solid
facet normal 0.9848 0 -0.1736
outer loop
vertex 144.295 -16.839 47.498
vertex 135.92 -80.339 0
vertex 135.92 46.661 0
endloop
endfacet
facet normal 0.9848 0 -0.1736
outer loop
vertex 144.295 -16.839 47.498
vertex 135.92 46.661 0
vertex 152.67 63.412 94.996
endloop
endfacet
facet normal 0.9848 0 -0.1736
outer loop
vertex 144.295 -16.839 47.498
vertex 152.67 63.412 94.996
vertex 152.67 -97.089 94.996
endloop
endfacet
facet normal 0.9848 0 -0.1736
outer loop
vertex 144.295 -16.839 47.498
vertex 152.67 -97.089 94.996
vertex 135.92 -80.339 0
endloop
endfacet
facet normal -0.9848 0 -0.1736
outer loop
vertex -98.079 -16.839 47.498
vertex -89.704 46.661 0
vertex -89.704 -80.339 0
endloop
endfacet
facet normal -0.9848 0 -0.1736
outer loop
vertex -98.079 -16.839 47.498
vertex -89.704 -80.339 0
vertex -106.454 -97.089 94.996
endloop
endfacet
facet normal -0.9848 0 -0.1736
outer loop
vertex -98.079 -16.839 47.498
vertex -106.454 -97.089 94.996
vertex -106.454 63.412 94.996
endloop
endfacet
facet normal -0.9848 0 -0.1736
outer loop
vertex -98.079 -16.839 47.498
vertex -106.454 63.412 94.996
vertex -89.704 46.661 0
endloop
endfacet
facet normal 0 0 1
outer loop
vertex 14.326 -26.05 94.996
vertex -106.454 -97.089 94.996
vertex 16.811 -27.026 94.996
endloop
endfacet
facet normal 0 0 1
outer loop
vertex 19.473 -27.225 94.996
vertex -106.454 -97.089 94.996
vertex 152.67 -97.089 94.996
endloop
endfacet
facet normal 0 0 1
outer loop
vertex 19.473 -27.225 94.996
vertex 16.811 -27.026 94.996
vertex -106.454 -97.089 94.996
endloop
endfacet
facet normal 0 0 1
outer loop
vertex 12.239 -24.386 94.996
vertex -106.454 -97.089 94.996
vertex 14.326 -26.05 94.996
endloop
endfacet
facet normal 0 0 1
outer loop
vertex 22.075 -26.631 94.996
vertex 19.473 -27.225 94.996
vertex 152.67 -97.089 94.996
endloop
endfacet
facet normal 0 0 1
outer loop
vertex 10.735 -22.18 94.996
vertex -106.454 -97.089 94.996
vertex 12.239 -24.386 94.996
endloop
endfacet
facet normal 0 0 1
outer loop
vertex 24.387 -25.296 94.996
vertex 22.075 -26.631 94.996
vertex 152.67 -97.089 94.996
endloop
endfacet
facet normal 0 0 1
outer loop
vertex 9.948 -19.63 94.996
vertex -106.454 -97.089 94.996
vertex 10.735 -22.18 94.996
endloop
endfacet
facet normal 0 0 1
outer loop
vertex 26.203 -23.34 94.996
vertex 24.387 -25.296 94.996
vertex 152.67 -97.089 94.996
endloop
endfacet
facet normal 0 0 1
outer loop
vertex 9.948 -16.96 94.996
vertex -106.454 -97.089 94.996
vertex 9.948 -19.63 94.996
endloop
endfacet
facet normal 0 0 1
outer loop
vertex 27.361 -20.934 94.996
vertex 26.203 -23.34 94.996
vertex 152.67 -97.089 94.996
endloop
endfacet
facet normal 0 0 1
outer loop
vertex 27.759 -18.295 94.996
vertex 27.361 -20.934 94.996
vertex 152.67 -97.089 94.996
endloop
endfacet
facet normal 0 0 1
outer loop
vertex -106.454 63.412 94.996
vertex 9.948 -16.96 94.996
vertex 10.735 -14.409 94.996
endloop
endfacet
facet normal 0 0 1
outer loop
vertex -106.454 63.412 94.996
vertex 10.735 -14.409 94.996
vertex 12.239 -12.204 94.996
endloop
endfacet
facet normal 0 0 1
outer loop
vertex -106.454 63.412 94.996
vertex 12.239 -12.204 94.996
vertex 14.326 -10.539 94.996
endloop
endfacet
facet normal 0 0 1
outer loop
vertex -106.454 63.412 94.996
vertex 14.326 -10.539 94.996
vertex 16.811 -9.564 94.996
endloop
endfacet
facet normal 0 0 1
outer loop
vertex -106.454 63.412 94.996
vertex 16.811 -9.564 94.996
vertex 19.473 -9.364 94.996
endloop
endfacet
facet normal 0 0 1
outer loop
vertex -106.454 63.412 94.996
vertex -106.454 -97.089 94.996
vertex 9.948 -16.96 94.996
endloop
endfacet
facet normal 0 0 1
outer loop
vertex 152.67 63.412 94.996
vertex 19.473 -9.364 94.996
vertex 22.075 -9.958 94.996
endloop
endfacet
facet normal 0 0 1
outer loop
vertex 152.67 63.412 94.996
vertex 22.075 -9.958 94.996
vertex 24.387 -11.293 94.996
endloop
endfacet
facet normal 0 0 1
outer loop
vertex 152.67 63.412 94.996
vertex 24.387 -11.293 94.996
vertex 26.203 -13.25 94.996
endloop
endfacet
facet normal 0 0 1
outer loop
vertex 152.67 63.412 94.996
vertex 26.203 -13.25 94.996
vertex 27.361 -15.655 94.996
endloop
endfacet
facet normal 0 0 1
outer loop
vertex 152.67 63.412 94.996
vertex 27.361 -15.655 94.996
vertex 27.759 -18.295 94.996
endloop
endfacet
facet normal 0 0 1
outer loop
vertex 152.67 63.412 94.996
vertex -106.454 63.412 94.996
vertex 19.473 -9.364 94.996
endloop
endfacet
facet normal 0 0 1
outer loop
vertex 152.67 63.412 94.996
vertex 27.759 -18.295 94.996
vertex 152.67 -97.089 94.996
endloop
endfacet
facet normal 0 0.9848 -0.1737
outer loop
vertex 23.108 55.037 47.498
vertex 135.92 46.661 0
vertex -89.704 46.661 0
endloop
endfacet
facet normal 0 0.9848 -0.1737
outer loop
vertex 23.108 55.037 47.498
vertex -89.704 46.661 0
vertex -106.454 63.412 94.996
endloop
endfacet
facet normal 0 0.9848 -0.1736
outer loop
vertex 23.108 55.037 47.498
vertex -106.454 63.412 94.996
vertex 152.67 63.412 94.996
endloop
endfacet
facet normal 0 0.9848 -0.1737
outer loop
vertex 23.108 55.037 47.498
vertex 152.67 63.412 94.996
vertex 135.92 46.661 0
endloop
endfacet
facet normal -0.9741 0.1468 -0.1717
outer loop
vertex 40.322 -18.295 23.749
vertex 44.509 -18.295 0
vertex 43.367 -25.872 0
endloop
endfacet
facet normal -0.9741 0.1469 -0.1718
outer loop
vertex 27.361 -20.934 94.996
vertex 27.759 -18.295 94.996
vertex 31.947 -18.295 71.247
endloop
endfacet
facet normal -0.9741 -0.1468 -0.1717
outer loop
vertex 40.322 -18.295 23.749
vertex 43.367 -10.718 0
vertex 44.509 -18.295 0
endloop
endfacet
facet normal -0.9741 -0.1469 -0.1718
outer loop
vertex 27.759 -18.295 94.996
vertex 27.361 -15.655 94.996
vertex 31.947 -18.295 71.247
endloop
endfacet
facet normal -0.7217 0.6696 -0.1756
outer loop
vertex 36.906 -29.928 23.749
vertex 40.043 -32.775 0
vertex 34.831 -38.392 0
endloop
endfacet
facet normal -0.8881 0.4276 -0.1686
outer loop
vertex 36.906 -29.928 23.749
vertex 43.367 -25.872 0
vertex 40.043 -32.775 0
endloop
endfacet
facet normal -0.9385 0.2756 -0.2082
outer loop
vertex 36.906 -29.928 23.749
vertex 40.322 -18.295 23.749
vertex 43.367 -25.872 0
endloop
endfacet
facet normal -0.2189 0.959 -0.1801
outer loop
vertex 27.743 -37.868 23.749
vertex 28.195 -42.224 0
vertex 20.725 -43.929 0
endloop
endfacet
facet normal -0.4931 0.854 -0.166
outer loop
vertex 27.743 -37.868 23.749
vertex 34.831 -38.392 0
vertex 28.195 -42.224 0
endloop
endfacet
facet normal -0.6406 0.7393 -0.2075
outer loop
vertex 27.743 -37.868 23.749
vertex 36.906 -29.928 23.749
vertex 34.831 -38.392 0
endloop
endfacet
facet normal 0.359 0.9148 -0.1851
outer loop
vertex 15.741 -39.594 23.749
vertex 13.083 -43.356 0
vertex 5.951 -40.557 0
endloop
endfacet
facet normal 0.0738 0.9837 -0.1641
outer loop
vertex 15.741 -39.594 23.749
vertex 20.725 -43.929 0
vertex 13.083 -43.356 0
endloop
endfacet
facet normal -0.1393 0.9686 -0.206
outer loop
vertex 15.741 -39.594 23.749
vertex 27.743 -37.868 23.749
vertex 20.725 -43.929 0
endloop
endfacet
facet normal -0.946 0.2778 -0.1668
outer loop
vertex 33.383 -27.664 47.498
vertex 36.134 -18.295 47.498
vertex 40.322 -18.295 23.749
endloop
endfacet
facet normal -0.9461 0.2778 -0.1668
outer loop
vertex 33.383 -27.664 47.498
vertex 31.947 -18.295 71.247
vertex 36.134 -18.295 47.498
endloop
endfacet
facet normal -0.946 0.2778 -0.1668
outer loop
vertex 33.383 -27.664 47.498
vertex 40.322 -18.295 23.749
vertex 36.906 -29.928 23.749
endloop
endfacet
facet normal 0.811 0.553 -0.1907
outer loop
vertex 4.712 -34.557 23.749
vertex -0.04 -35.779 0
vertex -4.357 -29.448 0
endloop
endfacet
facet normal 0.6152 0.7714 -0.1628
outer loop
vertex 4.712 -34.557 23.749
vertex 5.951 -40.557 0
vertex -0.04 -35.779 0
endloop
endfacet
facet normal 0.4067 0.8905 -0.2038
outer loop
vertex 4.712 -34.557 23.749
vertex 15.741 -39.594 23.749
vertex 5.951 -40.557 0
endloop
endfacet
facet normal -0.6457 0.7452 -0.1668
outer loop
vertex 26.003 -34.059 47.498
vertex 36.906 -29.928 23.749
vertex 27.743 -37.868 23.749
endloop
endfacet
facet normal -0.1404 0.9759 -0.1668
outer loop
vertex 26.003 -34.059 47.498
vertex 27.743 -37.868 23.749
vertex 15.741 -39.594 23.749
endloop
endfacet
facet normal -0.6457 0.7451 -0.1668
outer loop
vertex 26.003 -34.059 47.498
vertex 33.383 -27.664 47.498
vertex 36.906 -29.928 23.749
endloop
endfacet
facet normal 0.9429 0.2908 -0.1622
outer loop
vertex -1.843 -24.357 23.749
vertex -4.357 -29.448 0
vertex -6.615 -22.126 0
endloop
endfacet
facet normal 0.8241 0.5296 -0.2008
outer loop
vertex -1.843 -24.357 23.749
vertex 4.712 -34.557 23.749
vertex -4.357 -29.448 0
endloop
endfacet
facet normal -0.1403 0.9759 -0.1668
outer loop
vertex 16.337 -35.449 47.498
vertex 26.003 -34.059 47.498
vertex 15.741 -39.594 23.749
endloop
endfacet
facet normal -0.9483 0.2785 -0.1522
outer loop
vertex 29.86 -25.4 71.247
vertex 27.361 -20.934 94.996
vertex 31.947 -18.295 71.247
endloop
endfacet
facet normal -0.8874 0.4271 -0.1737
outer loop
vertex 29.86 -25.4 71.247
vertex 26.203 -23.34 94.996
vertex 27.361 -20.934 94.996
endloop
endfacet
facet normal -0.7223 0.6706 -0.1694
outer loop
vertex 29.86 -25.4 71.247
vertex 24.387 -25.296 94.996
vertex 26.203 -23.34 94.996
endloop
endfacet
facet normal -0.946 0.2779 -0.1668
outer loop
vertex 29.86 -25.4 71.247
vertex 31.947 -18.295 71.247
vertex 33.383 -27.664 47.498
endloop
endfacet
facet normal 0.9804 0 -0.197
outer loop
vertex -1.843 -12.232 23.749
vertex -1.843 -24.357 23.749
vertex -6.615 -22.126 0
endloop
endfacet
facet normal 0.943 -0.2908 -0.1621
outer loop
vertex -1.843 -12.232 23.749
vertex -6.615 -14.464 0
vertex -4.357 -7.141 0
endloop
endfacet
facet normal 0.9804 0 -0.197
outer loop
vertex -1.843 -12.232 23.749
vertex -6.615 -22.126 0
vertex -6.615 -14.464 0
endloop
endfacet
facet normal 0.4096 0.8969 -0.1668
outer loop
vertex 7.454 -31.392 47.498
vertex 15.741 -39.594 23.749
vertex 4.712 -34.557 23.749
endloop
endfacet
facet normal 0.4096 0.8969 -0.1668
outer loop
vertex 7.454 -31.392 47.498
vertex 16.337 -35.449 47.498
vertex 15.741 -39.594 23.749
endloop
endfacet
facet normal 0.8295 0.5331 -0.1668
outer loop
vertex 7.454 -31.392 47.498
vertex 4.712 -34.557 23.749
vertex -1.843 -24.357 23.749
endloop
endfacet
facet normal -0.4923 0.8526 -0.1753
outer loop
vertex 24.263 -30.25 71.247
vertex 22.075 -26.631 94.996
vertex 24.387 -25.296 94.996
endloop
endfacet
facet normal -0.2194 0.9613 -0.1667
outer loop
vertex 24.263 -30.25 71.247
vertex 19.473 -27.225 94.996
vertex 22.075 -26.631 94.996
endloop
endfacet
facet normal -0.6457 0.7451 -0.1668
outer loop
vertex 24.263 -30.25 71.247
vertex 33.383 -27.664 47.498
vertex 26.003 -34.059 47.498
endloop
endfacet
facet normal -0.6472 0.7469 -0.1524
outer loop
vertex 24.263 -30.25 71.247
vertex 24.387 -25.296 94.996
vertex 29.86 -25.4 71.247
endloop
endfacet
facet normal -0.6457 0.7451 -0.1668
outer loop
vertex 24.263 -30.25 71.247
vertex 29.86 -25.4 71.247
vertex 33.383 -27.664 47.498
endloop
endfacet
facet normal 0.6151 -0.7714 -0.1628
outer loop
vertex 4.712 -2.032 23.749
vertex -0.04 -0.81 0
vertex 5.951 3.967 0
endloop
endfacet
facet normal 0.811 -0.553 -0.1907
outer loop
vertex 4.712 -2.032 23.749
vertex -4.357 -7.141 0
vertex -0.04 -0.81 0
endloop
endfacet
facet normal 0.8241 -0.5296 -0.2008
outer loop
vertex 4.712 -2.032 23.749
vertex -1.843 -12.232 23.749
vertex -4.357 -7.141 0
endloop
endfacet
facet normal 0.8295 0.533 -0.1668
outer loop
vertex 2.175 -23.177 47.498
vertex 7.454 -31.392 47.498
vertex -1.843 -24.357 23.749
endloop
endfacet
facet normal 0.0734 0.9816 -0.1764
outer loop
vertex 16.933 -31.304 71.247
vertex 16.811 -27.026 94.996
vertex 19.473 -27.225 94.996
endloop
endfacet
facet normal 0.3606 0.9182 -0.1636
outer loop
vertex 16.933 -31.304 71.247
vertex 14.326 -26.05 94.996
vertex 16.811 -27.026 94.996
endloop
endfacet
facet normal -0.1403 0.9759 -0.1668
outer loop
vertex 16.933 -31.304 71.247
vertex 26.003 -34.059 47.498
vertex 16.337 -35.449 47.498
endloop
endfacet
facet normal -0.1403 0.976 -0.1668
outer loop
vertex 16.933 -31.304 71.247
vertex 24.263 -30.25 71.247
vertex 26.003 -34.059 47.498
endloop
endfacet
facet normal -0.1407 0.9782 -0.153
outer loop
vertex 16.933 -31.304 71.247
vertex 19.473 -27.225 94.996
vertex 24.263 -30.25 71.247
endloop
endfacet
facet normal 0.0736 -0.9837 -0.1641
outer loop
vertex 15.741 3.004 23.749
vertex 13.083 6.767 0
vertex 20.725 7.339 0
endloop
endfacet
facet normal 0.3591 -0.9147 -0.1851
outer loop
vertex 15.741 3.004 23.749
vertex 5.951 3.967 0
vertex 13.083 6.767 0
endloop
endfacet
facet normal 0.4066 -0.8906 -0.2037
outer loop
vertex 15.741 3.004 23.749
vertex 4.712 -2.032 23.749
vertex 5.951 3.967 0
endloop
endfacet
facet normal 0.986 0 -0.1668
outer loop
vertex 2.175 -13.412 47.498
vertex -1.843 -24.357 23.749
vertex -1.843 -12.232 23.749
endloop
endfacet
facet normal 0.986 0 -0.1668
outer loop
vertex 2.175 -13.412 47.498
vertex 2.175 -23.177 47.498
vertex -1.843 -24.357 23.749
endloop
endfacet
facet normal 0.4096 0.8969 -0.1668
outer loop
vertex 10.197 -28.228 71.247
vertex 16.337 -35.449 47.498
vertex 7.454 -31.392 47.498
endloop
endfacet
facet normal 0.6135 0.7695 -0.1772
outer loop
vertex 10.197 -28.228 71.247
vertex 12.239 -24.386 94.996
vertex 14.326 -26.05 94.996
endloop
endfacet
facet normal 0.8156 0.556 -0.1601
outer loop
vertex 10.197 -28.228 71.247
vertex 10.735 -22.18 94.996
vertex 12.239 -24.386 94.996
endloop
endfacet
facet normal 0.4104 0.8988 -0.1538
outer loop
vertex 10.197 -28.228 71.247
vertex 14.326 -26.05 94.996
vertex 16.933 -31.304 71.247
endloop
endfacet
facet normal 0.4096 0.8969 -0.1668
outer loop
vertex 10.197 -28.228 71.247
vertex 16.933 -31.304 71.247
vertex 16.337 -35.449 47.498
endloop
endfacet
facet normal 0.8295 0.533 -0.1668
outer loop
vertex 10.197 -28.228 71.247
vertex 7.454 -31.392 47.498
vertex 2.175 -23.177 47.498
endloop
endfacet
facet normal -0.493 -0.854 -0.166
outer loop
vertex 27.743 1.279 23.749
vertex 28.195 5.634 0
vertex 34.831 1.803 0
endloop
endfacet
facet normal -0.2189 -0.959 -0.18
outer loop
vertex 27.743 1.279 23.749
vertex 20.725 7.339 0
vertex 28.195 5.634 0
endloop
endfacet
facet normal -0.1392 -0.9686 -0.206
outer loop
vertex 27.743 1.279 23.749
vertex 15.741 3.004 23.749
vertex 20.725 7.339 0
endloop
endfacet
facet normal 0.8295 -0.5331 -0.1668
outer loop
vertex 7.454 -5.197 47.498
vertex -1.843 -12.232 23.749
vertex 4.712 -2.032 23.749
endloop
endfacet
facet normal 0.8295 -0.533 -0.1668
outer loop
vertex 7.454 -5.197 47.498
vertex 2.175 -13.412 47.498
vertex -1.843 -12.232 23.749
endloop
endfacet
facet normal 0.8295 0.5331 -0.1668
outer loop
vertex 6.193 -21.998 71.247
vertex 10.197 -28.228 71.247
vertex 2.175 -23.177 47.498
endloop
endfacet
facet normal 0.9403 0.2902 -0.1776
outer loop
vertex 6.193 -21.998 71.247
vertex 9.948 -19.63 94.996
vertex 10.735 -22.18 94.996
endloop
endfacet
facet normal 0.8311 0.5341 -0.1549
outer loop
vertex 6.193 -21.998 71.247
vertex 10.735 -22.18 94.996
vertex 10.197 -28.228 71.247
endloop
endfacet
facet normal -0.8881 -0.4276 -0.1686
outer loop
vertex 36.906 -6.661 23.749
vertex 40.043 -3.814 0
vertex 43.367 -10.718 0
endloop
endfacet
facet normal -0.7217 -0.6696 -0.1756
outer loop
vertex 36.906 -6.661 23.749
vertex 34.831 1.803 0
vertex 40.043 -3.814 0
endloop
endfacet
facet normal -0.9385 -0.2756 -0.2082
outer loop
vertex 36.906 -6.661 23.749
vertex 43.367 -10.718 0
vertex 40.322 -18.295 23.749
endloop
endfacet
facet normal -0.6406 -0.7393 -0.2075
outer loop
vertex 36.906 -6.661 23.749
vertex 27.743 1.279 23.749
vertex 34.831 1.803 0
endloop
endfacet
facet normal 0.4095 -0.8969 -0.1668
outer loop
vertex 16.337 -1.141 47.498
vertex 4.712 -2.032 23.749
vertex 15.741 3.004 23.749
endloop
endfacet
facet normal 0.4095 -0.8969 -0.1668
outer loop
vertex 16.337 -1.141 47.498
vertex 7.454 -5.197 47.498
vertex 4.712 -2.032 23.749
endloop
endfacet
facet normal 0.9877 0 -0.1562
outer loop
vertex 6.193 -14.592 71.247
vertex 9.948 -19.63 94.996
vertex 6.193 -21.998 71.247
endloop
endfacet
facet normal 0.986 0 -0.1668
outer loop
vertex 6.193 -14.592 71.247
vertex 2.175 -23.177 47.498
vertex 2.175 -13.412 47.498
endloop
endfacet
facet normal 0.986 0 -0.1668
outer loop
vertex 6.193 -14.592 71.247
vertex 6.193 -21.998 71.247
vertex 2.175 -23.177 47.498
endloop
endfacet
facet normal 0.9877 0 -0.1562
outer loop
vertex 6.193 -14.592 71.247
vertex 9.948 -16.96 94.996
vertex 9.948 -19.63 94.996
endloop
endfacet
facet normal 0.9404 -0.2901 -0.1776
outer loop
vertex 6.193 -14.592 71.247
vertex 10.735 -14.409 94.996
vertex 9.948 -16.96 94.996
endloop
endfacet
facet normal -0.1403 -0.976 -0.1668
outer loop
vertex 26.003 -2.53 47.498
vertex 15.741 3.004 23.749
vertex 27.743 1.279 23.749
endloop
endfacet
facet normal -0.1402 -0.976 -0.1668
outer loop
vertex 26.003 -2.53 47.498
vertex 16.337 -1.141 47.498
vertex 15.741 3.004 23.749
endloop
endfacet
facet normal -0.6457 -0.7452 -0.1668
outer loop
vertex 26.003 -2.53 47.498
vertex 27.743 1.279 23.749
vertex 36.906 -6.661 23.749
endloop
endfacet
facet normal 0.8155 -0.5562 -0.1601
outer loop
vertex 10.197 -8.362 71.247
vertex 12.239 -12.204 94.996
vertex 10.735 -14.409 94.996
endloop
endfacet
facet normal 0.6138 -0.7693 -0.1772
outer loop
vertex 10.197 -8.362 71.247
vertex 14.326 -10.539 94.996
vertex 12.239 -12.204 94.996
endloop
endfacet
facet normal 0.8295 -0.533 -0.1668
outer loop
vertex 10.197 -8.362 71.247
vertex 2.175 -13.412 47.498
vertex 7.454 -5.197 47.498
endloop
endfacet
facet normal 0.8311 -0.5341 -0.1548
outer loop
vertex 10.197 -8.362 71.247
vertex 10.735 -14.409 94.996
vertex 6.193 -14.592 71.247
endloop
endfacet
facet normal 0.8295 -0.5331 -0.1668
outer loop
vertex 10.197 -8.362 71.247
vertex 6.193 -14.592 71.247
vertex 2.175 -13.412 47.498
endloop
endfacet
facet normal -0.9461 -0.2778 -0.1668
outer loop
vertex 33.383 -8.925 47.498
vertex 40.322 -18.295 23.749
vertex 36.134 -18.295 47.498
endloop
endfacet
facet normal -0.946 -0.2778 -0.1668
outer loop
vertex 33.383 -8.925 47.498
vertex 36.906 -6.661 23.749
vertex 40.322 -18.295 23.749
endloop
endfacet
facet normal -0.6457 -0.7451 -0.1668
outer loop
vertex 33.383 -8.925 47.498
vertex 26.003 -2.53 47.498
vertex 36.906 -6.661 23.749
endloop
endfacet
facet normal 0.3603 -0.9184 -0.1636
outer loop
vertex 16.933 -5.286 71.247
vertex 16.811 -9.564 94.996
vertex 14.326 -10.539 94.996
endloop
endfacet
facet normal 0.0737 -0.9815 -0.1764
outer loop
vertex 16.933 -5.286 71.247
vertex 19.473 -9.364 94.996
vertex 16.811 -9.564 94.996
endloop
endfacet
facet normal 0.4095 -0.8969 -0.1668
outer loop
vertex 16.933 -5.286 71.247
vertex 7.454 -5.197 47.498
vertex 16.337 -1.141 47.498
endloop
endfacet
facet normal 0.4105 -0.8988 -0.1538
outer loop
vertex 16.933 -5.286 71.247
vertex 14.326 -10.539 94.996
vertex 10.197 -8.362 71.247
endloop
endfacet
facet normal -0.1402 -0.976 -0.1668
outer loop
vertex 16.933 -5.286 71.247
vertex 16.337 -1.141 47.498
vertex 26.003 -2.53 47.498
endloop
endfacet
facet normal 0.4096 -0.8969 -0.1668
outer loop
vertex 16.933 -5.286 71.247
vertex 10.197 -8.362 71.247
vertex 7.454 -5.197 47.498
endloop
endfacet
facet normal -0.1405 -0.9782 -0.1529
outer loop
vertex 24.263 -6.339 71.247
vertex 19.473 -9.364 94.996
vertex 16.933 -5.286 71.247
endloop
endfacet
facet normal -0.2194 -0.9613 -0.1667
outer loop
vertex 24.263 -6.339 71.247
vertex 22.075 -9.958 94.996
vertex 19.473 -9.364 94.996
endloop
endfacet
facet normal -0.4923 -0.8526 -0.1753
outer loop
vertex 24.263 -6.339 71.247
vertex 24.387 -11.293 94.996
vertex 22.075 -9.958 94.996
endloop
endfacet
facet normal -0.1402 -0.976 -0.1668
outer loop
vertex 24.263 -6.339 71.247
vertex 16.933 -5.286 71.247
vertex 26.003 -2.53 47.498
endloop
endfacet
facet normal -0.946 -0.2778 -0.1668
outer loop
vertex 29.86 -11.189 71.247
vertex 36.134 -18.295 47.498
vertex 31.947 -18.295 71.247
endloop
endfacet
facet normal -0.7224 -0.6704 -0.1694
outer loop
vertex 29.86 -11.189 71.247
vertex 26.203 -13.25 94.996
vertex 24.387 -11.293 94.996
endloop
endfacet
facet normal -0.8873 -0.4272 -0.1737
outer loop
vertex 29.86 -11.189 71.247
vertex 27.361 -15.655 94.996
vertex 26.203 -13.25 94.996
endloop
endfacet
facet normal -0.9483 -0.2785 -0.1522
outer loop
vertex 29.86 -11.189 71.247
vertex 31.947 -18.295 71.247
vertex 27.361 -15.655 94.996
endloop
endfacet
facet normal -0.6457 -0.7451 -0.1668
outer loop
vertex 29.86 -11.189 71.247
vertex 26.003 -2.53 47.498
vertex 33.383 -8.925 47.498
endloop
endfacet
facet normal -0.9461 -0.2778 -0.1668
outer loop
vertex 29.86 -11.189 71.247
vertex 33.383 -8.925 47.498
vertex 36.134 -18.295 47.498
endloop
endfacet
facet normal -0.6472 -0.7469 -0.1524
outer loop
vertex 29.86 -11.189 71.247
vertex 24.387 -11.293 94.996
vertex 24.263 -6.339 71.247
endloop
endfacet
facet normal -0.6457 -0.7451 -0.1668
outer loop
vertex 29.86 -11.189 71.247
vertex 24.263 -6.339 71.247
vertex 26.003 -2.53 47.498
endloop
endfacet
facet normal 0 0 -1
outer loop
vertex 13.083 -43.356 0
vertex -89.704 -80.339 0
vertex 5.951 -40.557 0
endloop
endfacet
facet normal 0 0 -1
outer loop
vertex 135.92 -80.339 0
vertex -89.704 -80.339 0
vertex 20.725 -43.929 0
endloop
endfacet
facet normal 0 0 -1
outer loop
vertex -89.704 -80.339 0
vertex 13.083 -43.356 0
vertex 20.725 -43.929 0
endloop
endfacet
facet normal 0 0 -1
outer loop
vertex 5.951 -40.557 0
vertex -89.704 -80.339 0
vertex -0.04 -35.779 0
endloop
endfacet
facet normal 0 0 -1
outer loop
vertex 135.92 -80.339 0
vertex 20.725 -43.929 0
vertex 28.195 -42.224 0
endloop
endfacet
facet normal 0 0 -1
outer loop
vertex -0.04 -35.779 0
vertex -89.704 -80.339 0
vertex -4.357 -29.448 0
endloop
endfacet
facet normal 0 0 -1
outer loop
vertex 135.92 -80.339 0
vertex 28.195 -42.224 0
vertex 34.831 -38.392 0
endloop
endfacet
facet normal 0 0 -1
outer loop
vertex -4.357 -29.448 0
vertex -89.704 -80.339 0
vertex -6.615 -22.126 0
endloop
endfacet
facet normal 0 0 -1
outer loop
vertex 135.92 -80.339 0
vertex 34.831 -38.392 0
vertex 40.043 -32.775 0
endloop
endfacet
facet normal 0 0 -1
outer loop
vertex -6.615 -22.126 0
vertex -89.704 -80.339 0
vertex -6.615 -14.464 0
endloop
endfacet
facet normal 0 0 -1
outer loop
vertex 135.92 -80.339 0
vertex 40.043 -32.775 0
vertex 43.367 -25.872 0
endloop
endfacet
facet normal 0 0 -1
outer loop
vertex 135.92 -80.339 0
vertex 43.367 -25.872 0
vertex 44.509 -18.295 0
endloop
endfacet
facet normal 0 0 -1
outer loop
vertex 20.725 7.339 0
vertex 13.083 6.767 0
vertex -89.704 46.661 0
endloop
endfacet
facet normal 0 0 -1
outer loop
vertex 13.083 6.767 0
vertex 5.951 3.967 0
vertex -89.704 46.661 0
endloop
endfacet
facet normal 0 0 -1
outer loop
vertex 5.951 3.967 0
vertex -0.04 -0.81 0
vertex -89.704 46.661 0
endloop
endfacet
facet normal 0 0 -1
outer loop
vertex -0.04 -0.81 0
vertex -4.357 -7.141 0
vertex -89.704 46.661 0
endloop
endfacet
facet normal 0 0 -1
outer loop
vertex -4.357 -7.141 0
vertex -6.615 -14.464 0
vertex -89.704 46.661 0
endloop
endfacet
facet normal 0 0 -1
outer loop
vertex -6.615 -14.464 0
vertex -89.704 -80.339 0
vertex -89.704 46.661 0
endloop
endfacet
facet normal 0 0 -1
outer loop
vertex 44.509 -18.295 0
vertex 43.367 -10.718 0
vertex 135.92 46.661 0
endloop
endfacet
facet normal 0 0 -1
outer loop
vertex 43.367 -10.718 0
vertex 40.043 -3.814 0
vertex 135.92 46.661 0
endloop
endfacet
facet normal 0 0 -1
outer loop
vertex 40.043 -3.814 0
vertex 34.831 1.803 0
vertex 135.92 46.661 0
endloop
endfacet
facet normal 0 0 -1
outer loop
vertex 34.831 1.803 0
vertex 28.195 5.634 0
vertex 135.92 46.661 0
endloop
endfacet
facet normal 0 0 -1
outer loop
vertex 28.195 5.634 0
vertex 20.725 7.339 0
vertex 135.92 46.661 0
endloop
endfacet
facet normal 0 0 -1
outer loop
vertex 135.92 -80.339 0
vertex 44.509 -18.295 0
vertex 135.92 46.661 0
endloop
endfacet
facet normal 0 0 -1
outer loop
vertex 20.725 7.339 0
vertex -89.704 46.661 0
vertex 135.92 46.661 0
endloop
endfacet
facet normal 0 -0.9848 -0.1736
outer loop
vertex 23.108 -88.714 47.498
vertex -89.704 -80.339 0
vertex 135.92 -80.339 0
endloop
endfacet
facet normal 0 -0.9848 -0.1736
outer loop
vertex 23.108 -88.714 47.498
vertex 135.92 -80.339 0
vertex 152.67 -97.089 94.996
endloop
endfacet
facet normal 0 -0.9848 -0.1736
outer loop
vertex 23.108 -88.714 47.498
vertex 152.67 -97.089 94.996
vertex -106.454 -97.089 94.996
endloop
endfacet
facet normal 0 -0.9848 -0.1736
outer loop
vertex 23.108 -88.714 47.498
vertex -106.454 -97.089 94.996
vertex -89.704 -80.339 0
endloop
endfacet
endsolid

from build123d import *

# Parameters (mm, degrees)
F0_W     = 225.6237479062
F0_H     = 127
F0_R     = 25.7058012272
F1_DEPTH = 94.996
F1_TAPER = -10


with BuildPart() as f1:
    # F0 (on Top) → F1 (new body)
    with BuildSketch(Plane.XY):
        with Locations((23.1080837548, -16.8385943398)):
            Rectangle(F0_W, F0_H)
        with Locations((18.8035357351, -18.2947983858)):
            Circle(F0_R, mode=Mode.SUBTRACT)
    extrude(amount=F1_DEPTH, taper=F1_TAPER)


solid = f1.part
